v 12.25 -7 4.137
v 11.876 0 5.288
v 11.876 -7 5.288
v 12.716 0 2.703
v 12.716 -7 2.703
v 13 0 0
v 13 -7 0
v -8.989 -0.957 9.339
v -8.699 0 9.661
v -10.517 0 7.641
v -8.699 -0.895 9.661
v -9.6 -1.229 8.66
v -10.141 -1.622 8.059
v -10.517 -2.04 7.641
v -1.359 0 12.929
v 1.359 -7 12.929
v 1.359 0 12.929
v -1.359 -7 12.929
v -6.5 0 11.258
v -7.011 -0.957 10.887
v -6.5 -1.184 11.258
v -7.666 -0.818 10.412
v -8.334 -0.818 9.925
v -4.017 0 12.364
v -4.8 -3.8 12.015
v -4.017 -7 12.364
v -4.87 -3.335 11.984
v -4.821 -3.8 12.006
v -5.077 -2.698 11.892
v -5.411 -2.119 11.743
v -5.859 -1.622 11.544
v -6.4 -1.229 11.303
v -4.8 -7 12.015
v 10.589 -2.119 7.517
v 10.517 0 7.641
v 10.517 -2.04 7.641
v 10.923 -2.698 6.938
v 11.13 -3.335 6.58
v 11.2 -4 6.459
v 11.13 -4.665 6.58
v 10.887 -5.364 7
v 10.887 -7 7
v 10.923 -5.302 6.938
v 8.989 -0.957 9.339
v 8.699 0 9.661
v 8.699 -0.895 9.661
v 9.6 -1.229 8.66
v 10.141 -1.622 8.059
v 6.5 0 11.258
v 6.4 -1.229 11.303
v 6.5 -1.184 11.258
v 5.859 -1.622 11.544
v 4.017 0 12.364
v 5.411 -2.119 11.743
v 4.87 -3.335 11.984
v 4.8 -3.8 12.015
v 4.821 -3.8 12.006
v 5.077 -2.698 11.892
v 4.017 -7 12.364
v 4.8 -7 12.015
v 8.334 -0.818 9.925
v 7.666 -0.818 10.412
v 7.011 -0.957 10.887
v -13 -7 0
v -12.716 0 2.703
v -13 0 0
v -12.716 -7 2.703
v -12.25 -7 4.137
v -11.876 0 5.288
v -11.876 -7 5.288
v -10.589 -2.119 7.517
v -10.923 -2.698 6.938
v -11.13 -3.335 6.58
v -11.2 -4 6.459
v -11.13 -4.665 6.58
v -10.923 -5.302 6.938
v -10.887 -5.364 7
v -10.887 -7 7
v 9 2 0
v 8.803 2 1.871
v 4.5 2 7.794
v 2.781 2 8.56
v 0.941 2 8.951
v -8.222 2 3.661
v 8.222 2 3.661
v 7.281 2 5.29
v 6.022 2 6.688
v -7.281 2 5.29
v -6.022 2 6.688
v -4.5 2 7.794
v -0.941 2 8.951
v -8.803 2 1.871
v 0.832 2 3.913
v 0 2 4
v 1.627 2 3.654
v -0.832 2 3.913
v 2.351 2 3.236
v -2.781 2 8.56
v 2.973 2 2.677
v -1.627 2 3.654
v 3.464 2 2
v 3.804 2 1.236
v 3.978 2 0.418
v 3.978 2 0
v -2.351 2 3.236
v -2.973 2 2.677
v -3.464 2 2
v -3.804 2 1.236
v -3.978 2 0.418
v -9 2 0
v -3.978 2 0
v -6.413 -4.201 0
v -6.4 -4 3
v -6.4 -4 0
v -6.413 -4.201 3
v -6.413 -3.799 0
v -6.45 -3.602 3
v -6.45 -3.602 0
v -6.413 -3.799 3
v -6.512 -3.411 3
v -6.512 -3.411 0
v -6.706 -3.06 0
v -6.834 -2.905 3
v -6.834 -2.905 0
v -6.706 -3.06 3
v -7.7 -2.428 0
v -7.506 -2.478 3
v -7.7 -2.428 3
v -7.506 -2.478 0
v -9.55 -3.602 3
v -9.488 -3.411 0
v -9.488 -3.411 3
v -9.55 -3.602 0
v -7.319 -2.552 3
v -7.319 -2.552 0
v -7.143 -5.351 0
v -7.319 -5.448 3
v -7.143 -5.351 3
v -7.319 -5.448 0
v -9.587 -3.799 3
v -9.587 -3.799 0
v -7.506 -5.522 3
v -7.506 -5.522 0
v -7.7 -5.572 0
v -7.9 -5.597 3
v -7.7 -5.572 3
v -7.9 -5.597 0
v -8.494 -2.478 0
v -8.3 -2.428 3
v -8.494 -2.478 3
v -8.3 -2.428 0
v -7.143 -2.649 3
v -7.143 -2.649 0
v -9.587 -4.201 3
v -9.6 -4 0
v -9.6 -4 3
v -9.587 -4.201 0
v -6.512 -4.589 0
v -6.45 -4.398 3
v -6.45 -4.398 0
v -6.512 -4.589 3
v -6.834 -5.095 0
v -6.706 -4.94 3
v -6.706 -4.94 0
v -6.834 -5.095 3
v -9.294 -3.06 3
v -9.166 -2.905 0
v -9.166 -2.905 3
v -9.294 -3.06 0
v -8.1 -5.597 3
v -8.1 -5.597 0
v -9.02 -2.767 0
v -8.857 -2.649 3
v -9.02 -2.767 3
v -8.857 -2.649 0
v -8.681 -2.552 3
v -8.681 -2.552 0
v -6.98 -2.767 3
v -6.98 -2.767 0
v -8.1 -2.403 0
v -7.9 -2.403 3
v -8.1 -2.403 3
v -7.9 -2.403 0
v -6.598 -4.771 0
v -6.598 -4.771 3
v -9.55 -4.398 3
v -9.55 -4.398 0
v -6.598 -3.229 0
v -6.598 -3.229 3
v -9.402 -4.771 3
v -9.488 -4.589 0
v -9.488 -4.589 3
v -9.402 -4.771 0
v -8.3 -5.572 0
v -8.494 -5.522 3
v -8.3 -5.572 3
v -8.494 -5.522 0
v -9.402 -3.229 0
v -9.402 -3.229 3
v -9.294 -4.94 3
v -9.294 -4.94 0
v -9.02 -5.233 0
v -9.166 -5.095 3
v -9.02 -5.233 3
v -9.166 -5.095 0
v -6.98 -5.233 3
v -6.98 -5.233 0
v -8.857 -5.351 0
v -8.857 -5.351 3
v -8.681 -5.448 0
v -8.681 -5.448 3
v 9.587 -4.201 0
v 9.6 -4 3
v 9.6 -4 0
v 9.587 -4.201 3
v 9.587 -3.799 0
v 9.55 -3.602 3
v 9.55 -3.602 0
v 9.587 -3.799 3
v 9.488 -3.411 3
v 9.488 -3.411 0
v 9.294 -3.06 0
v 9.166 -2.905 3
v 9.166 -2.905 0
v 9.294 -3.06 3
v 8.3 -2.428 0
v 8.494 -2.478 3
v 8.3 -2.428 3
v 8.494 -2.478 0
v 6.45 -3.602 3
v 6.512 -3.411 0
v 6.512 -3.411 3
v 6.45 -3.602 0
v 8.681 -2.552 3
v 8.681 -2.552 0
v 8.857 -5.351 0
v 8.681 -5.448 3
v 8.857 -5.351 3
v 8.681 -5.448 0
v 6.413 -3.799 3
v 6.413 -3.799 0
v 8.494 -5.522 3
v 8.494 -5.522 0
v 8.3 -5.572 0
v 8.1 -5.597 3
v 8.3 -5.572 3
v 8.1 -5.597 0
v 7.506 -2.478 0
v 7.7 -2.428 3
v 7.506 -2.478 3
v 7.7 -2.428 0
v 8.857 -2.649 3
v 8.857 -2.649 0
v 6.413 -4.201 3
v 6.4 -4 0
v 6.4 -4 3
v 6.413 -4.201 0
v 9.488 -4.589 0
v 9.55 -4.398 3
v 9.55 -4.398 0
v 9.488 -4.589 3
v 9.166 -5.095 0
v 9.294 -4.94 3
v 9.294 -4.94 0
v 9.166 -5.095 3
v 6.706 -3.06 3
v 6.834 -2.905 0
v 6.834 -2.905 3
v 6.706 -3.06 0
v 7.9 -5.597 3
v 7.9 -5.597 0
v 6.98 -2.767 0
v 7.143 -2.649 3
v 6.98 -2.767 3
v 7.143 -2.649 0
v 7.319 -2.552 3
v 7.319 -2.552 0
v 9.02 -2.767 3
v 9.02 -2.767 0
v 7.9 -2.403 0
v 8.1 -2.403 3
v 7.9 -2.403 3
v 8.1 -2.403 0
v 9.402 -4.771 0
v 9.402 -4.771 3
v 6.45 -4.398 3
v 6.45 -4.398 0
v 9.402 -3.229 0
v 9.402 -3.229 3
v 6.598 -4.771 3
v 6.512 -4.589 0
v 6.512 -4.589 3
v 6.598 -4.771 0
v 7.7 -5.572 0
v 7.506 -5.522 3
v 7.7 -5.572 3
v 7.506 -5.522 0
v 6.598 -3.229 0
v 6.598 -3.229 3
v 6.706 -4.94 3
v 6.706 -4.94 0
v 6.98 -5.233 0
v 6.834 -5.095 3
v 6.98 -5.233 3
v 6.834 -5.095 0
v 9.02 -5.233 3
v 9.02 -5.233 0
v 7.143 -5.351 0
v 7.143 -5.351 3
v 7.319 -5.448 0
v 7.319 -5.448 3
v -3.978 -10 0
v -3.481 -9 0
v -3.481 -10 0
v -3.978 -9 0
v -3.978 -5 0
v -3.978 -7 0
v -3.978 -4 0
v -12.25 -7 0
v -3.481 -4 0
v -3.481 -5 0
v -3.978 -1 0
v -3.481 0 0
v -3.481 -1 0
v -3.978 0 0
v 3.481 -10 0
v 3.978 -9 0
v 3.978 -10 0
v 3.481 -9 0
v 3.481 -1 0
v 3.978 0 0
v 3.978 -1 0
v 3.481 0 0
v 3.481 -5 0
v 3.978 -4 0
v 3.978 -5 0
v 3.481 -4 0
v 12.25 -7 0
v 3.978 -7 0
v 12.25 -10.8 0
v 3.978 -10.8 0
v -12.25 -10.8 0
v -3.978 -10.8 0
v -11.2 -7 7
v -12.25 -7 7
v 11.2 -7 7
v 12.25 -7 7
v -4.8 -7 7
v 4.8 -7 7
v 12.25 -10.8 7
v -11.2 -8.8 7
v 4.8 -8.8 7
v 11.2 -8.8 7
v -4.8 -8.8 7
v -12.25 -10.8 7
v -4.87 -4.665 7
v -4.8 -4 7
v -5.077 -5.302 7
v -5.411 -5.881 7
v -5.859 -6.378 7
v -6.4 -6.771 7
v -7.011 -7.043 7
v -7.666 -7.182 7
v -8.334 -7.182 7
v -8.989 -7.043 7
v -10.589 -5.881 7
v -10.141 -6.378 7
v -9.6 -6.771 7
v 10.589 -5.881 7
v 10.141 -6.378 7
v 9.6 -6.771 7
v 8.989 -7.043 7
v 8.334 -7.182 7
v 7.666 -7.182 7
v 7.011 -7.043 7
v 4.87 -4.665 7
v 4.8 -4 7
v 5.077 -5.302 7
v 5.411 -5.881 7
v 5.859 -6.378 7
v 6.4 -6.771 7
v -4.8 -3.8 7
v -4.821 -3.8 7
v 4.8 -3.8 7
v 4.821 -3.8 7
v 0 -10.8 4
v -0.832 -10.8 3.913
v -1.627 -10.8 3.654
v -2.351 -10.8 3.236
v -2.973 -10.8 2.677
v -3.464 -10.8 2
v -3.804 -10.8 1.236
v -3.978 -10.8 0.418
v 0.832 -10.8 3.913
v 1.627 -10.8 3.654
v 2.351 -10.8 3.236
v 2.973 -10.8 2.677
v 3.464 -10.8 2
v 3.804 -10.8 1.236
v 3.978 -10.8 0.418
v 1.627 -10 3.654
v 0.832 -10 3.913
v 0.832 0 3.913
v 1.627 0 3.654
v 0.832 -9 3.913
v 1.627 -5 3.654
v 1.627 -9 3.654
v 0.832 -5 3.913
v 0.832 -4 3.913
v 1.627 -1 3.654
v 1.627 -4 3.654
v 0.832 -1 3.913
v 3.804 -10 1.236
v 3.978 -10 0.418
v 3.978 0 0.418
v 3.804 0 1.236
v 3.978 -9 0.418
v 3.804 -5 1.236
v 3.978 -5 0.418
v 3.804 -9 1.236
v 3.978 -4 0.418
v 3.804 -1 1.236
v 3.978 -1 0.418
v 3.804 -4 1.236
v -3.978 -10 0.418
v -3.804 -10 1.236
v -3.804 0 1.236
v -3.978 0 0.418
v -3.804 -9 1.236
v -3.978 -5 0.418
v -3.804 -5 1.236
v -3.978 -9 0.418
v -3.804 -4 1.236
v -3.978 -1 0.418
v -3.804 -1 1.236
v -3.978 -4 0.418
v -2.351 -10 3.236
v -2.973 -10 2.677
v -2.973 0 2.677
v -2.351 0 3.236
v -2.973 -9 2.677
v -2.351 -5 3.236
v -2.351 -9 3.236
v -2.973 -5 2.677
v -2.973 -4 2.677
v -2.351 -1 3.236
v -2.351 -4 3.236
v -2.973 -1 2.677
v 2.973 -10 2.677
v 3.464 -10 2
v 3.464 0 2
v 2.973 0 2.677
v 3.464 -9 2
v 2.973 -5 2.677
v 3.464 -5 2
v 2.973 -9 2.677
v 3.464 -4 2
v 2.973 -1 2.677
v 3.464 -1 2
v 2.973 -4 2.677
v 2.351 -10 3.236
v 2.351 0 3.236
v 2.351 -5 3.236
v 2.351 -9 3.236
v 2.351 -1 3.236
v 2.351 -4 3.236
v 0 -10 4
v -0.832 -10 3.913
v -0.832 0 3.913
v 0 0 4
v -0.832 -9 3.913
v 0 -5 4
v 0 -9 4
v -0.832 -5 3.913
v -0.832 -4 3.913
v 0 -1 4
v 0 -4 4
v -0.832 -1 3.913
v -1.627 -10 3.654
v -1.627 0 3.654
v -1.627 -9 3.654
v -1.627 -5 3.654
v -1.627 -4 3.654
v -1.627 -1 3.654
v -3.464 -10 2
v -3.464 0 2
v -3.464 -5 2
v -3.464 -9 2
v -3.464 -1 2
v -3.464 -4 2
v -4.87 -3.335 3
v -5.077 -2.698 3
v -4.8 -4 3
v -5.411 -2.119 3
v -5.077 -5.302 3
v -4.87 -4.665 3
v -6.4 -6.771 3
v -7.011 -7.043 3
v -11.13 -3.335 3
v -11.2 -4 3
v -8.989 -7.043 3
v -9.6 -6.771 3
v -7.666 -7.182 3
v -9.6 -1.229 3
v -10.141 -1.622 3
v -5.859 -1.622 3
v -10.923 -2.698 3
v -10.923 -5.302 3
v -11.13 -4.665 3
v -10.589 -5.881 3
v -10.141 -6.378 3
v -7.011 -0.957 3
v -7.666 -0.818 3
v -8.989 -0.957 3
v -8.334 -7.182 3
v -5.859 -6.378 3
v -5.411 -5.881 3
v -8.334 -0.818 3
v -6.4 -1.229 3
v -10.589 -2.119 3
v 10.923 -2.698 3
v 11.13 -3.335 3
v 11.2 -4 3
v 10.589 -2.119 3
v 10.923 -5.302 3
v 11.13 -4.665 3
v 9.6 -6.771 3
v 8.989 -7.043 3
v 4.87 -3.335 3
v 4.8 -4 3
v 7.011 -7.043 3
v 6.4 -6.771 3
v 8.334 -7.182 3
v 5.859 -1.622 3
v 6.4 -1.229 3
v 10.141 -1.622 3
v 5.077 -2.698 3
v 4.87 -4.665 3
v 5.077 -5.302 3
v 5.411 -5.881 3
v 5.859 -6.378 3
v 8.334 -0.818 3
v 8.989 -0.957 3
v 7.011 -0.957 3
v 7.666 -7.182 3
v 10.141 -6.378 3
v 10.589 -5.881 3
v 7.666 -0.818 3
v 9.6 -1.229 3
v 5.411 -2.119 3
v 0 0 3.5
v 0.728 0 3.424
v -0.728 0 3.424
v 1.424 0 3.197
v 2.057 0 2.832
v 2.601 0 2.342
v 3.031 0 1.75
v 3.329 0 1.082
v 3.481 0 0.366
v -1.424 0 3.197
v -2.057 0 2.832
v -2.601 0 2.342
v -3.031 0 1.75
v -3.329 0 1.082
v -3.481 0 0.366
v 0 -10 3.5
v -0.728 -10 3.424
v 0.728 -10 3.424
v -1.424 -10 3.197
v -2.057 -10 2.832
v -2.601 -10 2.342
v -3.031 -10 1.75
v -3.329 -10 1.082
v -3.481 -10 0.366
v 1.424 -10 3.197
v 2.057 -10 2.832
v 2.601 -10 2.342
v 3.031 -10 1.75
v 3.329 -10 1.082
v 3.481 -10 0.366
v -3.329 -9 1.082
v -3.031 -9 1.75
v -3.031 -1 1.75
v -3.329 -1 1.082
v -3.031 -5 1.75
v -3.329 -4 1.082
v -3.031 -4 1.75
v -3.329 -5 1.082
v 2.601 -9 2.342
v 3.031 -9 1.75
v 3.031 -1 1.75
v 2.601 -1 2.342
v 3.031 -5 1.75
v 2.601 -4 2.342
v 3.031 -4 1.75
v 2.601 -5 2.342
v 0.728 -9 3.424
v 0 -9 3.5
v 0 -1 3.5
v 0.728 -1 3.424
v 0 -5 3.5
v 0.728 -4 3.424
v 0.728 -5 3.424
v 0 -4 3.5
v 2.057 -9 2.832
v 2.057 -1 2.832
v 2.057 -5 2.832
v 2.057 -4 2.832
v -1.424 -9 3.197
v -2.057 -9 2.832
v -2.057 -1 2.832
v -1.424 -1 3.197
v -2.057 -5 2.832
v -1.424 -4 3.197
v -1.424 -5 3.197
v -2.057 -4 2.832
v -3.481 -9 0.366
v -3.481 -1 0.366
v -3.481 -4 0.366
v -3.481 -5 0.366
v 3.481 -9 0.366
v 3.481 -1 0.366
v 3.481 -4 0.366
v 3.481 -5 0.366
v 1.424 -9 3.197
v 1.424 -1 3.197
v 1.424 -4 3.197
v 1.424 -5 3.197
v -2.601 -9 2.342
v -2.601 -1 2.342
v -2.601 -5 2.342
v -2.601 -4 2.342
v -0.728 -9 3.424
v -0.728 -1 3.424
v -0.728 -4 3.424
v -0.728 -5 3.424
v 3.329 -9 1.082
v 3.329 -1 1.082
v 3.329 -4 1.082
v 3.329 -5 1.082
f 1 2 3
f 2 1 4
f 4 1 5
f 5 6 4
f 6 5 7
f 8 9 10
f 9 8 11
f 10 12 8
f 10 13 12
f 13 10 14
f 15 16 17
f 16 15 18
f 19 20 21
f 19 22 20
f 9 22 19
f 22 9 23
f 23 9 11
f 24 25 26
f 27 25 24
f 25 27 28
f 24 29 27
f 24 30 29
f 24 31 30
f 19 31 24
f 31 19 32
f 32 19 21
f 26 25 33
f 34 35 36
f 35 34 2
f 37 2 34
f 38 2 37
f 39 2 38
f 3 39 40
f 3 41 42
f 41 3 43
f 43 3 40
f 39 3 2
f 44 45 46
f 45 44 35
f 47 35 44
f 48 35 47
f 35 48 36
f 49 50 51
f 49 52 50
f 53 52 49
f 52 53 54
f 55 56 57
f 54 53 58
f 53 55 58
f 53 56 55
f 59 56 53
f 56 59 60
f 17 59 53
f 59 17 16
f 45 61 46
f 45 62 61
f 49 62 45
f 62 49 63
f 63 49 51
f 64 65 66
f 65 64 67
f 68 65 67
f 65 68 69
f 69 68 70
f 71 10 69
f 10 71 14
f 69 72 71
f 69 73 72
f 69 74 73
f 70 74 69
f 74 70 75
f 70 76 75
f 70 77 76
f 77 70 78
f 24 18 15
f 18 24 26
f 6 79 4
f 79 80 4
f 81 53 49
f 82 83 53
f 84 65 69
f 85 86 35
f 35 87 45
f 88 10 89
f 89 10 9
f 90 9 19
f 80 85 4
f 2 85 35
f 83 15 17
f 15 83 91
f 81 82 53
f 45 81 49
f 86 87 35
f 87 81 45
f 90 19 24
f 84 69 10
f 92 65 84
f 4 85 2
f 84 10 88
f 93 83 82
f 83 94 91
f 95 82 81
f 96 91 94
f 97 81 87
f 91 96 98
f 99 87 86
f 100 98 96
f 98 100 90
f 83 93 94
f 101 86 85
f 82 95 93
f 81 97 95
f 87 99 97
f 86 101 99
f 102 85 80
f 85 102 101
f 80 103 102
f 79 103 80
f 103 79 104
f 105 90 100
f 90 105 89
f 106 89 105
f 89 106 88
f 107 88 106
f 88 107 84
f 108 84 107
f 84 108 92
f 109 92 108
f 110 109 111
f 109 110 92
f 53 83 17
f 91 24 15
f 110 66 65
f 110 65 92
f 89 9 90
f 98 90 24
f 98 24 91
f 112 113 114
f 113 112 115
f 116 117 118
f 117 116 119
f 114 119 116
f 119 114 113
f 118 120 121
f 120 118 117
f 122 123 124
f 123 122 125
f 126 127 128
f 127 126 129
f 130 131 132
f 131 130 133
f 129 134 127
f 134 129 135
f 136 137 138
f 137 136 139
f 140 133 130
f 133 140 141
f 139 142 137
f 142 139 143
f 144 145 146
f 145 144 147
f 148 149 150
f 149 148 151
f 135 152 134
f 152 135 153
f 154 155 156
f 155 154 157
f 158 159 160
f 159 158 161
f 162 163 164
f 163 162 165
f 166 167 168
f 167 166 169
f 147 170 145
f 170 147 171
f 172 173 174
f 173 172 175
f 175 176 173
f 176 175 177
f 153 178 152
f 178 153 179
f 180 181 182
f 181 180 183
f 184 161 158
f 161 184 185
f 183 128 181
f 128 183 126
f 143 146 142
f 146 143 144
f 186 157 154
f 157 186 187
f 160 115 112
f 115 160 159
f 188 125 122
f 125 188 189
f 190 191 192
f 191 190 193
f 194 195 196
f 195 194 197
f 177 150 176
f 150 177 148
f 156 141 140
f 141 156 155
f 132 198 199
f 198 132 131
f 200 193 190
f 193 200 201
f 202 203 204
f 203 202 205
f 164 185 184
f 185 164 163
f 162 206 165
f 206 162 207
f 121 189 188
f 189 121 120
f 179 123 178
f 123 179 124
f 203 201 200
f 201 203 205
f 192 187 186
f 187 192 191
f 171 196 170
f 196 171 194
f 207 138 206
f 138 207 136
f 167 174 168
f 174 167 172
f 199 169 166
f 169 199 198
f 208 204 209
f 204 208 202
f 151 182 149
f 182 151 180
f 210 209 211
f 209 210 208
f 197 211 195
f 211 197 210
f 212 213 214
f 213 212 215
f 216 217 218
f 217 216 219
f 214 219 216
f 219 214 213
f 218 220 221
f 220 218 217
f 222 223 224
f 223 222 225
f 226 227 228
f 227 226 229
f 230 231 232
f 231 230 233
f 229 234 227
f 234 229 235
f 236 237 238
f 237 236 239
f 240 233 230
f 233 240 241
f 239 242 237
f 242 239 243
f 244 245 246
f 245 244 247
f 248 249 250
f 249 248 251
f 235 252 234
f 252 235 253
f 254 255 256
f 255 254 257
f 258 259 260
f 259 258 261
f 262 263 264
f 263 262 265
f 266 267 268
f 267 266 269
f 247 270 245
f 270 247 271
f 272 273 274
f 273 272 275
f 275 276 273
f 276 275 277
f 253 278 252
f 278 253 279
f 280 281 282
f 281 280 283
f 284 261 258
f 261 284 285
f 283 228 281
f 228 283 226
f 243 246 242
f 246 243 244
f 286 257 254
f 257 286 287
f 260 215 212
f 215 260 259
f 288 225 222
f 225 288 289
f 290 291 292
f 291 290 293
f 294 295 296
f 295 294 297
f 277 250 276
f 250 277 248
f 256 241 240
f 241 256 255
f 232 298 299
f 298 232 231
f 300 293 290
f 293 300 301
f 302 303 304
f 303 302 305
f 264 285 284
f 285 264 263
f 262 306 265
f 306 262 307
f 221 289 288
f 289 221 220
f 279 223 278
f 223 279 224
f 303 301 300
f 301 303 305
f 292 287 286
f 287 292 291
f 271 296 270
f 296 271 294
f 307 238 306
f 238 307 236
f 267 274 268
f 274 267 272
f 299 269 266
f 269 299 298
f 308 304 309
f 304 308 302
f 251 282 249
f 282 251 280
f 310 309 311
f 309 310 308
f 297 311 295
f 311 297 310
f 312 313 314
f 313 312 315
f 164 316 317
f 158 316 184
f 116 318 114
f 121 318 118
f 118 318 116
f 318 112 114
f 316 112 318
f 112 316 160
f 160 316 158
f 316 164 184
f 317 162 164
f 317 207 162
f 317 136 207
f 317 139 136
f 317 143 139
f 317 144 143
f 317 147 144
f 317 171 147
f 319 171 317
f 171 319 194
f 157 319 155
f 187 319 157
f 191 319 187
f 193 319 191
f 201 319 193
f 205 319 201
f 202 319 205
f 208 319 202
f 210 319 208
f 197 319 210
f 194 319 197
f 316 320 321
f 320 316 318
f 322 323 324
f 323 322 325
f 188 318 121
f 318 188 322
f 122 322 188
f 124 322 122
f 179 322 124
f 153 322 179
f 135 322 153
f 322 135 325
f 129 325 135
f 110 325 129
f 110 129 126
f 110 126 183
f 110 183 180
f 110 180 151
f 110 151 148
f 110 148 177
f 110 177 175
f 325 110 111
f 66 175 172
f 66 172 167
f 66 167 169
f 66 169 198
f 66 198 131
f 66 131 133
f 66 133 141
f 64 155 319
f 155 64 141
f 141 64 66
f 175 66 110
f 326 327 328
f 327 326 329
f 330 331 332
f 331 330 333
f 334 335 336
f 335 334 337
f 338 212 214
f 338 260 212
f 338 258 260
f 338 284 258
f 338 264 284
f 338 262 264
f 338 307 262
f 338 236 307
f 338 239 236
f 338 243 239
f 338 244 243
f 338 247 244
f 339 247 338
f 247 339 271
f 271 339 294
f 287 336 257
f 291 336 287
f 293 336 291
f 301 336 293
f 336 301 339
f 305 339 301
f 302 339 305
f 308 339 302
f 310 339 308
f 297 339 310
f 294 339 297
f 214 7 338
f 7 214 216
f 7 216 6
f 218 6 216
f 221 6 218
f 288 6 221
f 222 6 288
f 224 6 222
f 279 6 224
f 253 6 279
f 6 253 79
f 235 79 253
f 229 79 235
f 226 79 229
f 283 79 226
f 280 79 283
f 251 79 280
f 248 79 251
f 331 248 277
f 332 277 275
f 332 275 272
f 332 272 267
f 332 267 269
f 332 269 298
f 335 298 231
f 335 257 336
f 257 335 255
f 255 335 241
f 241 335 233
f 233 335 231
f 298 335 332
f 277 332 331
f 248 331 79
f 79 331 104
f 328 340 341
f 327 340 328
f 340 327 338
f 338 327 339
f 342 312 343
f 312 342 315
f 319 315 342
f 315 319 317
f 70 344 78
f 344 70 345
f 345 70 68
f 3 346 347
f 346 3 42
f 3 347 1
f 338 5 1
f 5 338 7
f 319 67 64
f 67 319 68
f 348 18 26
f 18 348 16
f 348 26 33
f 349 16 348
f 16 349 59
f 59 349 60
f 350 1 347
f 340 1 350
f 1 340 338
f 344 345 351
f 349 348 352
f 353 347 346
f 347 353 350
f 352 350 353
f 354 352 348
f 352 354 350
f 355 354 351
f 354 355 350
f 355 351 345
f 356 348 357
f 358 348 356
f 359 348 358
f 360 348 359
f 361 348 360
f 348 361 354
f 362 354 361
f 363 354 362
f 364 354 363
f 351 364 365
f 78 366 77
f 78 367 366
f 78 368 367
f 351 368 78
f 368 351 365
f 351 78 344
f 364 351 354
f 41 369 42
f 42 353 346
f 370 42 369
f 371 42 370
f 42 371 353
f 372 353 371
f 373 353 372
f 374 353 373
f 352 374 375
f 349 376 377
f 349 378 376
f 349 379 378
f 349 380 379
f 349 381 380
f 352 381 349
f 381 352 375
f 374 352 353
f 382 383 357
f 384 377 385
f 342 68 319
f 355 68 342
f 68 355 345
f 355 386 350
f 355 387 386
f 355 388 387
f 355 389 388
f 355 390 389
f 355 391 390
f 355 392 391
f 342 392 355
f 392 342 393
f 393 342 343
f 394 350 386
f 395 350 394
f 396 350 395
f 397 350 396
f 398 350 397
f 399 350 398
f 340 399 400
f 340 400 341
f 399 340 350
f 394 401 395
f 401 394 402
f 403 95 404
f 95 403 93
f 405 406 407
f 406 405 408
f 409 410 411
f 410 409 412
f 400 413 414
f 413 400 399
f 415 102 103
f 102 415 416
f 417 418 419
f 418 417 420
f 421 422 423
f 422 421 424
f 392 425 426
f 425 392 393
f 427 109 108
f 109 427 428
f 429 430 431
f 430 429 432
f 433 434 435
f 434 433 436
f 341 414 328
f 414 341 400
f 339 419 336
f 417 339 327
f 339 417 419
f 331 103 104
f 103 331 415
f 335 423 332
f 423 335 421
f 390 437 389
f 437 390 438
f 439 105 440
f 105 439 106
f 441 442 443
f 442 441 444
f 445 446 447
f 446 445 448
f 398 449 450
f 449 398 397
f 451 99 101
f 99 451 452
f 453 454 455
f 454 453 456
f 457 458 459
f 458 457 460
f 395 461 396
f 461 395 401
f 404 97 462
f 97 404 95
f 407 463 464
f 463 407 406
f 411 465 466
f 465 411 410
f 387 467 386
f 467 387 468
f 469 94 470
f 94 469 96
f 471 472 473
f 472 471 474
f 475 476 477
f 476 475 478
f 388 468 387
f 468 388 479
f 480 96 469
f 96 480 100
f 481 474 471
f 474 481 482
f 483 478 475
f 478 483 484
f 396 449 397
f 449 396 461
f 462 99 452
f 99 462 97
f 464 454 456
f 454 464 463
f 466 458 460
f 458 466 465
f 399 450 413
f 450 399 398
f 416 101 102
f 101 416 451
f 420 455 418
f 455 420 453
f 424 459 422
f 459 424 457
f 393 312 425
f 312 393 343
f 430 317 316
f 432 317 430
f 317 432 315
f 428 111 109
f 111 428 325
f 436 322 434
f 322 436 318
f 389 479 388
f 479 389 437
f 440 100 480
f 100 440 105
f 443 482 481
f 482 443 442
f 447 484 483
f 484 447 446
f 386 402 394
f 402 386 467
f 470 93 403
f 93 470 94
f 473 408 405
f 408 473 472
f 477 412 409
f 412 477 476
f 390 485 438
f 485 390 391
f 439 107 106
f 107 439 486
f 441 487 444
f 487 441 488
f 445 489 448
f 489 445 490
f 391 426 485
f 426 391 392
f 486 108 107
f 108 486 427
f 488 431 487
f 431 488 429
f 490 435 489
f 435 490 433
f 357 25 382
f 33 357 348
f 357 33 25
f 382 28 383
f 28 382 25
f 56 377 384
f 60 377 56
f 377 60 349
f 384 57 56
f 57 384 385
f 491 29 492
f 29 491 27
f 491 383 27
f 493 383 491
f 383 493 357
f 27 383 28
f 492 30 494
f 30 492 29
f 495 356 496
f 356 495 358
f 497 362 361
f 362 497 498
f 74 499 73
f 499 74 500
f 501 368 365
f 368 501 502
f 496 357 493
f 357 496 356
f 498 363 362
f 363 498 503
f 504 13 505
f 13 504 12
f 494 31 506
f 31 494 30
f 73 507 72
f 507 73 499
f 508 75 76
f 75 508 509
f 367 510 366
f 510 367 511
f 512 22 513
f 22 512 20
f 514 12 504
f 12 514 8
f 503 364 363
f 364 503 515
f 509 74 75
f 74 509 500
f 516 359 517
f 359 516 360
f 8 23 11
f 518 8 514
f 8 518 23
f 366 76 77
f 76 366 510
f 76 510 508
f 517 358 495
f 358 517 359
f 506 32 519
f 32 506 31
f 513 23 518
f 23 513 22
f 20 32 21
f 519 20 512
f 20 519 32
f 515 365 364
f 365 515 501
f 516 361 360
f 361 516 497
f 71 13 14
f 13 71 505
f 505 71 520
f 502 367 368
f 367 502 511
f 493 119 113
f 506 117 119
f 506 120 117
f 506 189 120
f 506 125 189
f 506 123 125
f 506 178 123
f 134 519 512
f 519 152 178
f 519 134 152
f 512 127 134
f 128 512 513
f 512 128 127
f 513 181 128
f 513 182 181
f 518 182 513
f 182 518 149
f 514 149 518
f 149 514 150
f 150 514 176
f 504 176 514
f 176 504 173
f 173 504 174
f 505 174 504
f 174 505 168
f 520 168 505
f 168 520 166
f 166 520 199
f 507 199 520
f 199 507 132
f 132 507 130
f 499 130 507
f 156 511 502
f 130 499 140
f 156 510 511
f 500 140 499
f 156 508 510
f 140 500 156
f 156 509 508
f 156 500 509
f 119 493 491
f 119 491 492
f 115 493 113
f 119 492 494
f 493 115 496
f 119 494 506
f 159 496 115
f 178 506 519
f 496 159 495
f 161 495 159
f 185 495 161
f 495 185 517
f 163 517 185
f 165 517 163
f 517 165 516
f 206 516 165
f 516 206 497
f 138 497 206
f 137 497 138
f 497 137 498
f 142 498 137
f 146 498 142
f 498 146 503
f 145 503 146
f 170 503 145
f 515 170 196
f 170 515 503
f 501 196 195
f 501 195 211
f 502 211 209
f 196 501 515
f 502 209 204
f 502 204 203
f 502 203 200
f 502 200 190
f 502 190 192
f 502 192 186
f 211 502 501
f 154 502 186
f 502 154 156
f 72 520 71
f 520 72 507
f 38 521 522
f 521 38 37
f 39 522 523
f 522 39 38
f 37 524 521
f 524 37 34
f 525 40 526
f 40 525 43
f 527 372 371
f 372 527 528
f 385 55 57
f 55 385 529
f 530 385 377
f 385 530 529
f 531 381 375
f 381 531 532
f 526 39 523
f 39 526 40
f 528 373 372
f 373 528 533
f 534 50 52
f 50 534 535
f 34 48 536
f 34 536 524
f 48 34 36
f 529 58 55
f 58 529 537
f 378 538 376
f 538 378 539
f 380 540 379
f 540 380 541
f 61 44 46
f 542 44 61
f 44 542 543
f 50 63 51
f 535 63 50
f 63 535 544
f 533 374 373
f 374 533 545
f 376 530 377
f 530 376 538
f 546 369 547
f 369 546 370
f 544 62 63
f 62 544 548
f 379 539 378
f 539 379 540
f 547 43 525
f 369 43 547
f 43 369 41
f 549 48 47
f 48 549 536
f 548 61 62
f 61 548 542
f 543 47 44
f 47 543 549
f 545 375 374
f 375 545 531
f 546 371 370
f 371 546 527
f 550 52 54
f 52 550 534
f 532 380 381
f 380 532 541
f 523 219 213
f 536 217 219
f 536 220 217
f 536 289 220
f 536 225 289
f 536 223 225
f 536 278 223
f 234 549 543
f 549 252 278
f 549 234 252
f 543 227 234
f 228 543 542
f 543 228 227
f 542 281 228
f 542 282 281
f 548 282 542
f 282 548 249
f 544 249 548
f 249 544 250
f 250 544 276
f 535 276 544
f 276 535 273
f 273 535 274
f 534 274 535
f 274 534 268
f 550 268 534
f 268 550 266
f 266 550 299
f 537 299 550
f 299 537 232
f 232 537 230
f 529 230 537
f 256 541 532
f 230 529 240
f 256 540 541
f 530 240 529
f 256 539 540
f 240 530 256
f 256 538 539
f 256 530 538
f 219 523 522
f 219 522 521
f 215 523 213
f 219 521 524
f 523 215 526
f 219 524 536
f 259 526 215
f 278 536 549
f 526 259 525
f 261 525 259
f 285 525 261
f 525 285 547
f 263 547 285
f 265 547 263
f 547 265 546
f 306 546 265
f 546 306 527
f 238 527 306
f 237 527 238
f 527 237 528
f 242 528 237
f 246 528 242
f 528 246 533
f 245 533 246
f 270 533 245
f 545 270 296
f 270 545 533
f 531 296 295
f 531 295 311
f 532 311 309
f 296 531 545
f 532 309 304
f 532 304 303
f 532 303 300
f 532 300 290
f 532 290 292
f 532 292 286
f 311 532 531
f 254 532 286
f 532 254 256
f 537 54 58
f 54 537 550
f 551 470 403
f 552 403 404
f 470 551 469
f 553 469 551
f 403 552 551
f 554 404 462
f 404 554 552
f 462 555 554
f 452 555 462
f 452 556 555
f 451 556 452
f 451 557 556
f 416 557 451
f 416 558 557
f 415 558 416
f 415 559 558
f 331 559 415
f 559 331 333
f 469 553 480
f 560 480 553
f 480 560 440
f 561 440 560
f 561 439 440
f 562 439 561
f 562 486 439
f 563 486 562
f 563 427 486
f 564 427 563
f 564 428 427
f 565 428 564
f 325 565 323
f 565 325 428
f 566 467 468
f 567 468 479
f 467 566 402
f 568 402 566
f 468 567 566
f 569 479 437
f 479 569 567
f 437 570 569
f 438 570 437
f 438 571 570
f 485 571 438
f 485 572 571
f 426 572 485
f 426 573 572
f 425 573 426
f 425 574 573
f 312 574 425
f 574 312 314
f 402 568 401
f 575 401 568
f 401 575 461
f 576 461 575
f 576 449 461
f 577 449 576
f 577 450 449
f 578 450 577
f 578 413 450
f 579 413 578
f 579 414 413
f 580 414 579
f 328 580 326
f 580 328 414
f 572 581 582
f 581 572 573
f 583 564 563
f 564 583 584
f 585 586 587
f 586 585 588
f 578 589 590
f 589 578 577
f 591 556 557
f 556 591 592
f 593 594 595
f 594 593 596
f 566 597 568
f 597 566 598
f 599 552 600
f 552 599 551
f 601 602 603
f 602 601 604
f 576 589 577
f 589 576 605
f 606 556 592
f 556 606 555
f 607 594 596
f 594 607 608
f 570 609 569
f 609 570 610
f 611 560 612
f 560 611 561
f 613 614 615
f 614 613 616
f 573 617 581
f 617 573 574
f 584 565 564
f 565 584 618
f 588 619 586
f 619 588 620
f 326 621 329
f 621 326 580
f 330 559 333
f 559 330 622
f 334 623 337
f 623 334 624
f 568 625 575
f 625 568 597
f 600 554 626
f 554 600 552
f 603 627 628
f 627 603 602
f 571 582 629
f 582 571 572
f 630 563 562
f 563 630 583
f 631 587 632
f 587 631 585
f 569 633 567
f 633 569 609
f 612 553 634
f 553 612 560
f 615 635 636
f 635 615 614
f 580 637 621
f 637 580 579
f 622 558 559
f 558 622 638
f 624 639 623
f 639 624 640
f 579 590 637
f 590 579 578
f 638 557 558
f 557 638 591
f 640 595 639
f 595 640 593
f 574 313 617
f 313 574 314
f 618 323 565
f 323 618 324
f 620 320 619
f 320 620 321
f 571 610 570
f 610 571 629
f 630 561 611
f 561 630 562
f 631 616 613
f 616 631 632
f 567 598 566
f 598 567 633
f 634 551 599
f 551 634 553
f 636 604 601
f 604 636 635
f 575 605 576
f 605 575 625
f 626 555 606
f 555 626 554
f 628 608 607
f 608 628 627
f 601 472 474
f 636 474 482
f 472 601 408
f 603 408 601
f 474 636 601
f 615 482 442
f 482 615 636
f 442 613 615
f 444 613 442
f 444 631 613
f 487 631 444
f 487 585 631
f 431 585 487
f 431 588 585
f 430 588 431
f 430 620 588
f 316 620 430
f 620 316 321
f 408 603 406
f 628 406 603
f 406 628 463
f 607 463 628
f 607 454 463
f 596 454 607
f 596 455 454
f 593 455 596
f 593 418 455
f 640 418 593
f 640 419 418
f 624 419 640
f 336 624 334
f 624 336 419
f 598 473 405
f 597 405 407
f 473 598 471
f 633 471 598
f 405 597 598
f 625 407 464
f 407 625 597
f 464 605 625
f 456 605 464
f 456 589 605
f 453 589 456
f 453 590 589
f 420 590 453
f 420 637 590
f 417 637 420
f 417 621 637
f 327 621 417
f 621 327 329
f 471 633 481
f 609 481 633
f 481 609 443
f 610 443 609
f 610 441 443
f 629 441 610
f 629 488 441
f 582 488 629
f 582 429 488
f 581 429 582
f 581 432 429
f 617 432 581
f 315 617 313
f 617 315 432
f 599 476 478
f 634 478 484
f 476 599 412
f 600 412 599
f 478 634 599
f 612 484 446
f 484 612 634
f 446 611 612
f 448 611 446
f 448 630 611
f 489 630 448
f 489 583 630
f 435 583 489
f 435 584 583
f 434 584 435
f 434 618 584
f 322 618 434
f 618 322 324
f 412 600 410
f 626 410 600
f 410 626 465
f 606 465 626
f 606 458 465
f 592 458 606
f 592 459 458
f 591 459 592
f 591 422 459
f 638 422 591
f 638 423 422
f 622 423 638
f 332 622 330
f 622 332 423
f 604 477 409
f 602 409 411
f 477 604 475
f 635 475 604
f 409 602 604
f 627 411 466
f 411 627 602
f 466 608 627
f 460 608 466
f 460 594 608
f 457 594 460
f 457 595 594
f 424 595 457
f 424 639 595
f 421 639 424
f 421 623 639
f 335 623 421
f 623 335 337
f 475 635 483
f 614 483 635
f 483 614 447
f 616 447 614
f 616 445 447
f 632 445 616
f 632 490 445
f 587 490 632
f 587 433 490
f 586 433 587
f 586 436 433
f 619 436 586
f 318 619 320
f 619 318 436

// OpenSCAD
// PRUSA iteration4
// Heatbed cable clip
// GNU GPL v3
// Josef Průša <iam@josefprusa.cz> and contributors
// http://www.reprap.org/wiki/Prusa_Mendel
// http://prusamendel.org

module heatbed_cable_clip(){
    difference(){
        union(){
            difference(){
                union(){
                    // body base
                    translate([75,99,28]) rotate([90,0,0]) cylinder(h=15,r=13,$fn=30);
                    translate([75,101,28]) rotate([90,0,0]) cylinder(h=2,r1=9,r2=13,$fn=30);
                }

                // screws
                translate([67,95,14]) rotate([0,0,0]) cylinder(h=35,r=1.6,$fn=50);
                translate([83,95,14]) rotate([0,0,0]) cylinder(h=35,r=1.6,$fn=50);

                // cut flat and shape
                translate([60,82,14]) cube([30,20,14]);
                translate([60,72,20]) cube([30,20,30]);
            }
            translate([62.75,88.2,28]) cube([24.5,3.8,7]);
        }

        // cable opening
        translate([75,105,28]) rotate([90,90,0]) cylinder(h=30,r=4.0,$fn=30);

        // screws opening
        translate([67-3.2,90.2,35]) cube([6.4,5,7]);
        translate([83-3.2,90.2,35]) cube([6.4,5,7]);

        // screw heads
        translate([67,95,31]) rotate([0,0,0]) cylinder(h=10,r=3.2,$fn=30);
        translate([83,95,31]) rotate([0,0,0]) cylinder(h=10,r=3.2,$fn=30);
    }

    difference(){
        // cable grip
        translate([75,99,28]) rotate([90,90,0]) cylinder(h=10,r=4.5,$fn=30);
        translate([75,105,28]) rotate([90,90,0]) cylinder(h=30,r=3.5,$fn=30);
        translate([60,72,14]) cube([30,40,14]);
        translate([60,90,24]) cube([30,4,14]);
        translate([60,95,24]) cube([30,3,14]);
    }
}

translate([-75,-99,-28]) heatbed_cable_clip();
